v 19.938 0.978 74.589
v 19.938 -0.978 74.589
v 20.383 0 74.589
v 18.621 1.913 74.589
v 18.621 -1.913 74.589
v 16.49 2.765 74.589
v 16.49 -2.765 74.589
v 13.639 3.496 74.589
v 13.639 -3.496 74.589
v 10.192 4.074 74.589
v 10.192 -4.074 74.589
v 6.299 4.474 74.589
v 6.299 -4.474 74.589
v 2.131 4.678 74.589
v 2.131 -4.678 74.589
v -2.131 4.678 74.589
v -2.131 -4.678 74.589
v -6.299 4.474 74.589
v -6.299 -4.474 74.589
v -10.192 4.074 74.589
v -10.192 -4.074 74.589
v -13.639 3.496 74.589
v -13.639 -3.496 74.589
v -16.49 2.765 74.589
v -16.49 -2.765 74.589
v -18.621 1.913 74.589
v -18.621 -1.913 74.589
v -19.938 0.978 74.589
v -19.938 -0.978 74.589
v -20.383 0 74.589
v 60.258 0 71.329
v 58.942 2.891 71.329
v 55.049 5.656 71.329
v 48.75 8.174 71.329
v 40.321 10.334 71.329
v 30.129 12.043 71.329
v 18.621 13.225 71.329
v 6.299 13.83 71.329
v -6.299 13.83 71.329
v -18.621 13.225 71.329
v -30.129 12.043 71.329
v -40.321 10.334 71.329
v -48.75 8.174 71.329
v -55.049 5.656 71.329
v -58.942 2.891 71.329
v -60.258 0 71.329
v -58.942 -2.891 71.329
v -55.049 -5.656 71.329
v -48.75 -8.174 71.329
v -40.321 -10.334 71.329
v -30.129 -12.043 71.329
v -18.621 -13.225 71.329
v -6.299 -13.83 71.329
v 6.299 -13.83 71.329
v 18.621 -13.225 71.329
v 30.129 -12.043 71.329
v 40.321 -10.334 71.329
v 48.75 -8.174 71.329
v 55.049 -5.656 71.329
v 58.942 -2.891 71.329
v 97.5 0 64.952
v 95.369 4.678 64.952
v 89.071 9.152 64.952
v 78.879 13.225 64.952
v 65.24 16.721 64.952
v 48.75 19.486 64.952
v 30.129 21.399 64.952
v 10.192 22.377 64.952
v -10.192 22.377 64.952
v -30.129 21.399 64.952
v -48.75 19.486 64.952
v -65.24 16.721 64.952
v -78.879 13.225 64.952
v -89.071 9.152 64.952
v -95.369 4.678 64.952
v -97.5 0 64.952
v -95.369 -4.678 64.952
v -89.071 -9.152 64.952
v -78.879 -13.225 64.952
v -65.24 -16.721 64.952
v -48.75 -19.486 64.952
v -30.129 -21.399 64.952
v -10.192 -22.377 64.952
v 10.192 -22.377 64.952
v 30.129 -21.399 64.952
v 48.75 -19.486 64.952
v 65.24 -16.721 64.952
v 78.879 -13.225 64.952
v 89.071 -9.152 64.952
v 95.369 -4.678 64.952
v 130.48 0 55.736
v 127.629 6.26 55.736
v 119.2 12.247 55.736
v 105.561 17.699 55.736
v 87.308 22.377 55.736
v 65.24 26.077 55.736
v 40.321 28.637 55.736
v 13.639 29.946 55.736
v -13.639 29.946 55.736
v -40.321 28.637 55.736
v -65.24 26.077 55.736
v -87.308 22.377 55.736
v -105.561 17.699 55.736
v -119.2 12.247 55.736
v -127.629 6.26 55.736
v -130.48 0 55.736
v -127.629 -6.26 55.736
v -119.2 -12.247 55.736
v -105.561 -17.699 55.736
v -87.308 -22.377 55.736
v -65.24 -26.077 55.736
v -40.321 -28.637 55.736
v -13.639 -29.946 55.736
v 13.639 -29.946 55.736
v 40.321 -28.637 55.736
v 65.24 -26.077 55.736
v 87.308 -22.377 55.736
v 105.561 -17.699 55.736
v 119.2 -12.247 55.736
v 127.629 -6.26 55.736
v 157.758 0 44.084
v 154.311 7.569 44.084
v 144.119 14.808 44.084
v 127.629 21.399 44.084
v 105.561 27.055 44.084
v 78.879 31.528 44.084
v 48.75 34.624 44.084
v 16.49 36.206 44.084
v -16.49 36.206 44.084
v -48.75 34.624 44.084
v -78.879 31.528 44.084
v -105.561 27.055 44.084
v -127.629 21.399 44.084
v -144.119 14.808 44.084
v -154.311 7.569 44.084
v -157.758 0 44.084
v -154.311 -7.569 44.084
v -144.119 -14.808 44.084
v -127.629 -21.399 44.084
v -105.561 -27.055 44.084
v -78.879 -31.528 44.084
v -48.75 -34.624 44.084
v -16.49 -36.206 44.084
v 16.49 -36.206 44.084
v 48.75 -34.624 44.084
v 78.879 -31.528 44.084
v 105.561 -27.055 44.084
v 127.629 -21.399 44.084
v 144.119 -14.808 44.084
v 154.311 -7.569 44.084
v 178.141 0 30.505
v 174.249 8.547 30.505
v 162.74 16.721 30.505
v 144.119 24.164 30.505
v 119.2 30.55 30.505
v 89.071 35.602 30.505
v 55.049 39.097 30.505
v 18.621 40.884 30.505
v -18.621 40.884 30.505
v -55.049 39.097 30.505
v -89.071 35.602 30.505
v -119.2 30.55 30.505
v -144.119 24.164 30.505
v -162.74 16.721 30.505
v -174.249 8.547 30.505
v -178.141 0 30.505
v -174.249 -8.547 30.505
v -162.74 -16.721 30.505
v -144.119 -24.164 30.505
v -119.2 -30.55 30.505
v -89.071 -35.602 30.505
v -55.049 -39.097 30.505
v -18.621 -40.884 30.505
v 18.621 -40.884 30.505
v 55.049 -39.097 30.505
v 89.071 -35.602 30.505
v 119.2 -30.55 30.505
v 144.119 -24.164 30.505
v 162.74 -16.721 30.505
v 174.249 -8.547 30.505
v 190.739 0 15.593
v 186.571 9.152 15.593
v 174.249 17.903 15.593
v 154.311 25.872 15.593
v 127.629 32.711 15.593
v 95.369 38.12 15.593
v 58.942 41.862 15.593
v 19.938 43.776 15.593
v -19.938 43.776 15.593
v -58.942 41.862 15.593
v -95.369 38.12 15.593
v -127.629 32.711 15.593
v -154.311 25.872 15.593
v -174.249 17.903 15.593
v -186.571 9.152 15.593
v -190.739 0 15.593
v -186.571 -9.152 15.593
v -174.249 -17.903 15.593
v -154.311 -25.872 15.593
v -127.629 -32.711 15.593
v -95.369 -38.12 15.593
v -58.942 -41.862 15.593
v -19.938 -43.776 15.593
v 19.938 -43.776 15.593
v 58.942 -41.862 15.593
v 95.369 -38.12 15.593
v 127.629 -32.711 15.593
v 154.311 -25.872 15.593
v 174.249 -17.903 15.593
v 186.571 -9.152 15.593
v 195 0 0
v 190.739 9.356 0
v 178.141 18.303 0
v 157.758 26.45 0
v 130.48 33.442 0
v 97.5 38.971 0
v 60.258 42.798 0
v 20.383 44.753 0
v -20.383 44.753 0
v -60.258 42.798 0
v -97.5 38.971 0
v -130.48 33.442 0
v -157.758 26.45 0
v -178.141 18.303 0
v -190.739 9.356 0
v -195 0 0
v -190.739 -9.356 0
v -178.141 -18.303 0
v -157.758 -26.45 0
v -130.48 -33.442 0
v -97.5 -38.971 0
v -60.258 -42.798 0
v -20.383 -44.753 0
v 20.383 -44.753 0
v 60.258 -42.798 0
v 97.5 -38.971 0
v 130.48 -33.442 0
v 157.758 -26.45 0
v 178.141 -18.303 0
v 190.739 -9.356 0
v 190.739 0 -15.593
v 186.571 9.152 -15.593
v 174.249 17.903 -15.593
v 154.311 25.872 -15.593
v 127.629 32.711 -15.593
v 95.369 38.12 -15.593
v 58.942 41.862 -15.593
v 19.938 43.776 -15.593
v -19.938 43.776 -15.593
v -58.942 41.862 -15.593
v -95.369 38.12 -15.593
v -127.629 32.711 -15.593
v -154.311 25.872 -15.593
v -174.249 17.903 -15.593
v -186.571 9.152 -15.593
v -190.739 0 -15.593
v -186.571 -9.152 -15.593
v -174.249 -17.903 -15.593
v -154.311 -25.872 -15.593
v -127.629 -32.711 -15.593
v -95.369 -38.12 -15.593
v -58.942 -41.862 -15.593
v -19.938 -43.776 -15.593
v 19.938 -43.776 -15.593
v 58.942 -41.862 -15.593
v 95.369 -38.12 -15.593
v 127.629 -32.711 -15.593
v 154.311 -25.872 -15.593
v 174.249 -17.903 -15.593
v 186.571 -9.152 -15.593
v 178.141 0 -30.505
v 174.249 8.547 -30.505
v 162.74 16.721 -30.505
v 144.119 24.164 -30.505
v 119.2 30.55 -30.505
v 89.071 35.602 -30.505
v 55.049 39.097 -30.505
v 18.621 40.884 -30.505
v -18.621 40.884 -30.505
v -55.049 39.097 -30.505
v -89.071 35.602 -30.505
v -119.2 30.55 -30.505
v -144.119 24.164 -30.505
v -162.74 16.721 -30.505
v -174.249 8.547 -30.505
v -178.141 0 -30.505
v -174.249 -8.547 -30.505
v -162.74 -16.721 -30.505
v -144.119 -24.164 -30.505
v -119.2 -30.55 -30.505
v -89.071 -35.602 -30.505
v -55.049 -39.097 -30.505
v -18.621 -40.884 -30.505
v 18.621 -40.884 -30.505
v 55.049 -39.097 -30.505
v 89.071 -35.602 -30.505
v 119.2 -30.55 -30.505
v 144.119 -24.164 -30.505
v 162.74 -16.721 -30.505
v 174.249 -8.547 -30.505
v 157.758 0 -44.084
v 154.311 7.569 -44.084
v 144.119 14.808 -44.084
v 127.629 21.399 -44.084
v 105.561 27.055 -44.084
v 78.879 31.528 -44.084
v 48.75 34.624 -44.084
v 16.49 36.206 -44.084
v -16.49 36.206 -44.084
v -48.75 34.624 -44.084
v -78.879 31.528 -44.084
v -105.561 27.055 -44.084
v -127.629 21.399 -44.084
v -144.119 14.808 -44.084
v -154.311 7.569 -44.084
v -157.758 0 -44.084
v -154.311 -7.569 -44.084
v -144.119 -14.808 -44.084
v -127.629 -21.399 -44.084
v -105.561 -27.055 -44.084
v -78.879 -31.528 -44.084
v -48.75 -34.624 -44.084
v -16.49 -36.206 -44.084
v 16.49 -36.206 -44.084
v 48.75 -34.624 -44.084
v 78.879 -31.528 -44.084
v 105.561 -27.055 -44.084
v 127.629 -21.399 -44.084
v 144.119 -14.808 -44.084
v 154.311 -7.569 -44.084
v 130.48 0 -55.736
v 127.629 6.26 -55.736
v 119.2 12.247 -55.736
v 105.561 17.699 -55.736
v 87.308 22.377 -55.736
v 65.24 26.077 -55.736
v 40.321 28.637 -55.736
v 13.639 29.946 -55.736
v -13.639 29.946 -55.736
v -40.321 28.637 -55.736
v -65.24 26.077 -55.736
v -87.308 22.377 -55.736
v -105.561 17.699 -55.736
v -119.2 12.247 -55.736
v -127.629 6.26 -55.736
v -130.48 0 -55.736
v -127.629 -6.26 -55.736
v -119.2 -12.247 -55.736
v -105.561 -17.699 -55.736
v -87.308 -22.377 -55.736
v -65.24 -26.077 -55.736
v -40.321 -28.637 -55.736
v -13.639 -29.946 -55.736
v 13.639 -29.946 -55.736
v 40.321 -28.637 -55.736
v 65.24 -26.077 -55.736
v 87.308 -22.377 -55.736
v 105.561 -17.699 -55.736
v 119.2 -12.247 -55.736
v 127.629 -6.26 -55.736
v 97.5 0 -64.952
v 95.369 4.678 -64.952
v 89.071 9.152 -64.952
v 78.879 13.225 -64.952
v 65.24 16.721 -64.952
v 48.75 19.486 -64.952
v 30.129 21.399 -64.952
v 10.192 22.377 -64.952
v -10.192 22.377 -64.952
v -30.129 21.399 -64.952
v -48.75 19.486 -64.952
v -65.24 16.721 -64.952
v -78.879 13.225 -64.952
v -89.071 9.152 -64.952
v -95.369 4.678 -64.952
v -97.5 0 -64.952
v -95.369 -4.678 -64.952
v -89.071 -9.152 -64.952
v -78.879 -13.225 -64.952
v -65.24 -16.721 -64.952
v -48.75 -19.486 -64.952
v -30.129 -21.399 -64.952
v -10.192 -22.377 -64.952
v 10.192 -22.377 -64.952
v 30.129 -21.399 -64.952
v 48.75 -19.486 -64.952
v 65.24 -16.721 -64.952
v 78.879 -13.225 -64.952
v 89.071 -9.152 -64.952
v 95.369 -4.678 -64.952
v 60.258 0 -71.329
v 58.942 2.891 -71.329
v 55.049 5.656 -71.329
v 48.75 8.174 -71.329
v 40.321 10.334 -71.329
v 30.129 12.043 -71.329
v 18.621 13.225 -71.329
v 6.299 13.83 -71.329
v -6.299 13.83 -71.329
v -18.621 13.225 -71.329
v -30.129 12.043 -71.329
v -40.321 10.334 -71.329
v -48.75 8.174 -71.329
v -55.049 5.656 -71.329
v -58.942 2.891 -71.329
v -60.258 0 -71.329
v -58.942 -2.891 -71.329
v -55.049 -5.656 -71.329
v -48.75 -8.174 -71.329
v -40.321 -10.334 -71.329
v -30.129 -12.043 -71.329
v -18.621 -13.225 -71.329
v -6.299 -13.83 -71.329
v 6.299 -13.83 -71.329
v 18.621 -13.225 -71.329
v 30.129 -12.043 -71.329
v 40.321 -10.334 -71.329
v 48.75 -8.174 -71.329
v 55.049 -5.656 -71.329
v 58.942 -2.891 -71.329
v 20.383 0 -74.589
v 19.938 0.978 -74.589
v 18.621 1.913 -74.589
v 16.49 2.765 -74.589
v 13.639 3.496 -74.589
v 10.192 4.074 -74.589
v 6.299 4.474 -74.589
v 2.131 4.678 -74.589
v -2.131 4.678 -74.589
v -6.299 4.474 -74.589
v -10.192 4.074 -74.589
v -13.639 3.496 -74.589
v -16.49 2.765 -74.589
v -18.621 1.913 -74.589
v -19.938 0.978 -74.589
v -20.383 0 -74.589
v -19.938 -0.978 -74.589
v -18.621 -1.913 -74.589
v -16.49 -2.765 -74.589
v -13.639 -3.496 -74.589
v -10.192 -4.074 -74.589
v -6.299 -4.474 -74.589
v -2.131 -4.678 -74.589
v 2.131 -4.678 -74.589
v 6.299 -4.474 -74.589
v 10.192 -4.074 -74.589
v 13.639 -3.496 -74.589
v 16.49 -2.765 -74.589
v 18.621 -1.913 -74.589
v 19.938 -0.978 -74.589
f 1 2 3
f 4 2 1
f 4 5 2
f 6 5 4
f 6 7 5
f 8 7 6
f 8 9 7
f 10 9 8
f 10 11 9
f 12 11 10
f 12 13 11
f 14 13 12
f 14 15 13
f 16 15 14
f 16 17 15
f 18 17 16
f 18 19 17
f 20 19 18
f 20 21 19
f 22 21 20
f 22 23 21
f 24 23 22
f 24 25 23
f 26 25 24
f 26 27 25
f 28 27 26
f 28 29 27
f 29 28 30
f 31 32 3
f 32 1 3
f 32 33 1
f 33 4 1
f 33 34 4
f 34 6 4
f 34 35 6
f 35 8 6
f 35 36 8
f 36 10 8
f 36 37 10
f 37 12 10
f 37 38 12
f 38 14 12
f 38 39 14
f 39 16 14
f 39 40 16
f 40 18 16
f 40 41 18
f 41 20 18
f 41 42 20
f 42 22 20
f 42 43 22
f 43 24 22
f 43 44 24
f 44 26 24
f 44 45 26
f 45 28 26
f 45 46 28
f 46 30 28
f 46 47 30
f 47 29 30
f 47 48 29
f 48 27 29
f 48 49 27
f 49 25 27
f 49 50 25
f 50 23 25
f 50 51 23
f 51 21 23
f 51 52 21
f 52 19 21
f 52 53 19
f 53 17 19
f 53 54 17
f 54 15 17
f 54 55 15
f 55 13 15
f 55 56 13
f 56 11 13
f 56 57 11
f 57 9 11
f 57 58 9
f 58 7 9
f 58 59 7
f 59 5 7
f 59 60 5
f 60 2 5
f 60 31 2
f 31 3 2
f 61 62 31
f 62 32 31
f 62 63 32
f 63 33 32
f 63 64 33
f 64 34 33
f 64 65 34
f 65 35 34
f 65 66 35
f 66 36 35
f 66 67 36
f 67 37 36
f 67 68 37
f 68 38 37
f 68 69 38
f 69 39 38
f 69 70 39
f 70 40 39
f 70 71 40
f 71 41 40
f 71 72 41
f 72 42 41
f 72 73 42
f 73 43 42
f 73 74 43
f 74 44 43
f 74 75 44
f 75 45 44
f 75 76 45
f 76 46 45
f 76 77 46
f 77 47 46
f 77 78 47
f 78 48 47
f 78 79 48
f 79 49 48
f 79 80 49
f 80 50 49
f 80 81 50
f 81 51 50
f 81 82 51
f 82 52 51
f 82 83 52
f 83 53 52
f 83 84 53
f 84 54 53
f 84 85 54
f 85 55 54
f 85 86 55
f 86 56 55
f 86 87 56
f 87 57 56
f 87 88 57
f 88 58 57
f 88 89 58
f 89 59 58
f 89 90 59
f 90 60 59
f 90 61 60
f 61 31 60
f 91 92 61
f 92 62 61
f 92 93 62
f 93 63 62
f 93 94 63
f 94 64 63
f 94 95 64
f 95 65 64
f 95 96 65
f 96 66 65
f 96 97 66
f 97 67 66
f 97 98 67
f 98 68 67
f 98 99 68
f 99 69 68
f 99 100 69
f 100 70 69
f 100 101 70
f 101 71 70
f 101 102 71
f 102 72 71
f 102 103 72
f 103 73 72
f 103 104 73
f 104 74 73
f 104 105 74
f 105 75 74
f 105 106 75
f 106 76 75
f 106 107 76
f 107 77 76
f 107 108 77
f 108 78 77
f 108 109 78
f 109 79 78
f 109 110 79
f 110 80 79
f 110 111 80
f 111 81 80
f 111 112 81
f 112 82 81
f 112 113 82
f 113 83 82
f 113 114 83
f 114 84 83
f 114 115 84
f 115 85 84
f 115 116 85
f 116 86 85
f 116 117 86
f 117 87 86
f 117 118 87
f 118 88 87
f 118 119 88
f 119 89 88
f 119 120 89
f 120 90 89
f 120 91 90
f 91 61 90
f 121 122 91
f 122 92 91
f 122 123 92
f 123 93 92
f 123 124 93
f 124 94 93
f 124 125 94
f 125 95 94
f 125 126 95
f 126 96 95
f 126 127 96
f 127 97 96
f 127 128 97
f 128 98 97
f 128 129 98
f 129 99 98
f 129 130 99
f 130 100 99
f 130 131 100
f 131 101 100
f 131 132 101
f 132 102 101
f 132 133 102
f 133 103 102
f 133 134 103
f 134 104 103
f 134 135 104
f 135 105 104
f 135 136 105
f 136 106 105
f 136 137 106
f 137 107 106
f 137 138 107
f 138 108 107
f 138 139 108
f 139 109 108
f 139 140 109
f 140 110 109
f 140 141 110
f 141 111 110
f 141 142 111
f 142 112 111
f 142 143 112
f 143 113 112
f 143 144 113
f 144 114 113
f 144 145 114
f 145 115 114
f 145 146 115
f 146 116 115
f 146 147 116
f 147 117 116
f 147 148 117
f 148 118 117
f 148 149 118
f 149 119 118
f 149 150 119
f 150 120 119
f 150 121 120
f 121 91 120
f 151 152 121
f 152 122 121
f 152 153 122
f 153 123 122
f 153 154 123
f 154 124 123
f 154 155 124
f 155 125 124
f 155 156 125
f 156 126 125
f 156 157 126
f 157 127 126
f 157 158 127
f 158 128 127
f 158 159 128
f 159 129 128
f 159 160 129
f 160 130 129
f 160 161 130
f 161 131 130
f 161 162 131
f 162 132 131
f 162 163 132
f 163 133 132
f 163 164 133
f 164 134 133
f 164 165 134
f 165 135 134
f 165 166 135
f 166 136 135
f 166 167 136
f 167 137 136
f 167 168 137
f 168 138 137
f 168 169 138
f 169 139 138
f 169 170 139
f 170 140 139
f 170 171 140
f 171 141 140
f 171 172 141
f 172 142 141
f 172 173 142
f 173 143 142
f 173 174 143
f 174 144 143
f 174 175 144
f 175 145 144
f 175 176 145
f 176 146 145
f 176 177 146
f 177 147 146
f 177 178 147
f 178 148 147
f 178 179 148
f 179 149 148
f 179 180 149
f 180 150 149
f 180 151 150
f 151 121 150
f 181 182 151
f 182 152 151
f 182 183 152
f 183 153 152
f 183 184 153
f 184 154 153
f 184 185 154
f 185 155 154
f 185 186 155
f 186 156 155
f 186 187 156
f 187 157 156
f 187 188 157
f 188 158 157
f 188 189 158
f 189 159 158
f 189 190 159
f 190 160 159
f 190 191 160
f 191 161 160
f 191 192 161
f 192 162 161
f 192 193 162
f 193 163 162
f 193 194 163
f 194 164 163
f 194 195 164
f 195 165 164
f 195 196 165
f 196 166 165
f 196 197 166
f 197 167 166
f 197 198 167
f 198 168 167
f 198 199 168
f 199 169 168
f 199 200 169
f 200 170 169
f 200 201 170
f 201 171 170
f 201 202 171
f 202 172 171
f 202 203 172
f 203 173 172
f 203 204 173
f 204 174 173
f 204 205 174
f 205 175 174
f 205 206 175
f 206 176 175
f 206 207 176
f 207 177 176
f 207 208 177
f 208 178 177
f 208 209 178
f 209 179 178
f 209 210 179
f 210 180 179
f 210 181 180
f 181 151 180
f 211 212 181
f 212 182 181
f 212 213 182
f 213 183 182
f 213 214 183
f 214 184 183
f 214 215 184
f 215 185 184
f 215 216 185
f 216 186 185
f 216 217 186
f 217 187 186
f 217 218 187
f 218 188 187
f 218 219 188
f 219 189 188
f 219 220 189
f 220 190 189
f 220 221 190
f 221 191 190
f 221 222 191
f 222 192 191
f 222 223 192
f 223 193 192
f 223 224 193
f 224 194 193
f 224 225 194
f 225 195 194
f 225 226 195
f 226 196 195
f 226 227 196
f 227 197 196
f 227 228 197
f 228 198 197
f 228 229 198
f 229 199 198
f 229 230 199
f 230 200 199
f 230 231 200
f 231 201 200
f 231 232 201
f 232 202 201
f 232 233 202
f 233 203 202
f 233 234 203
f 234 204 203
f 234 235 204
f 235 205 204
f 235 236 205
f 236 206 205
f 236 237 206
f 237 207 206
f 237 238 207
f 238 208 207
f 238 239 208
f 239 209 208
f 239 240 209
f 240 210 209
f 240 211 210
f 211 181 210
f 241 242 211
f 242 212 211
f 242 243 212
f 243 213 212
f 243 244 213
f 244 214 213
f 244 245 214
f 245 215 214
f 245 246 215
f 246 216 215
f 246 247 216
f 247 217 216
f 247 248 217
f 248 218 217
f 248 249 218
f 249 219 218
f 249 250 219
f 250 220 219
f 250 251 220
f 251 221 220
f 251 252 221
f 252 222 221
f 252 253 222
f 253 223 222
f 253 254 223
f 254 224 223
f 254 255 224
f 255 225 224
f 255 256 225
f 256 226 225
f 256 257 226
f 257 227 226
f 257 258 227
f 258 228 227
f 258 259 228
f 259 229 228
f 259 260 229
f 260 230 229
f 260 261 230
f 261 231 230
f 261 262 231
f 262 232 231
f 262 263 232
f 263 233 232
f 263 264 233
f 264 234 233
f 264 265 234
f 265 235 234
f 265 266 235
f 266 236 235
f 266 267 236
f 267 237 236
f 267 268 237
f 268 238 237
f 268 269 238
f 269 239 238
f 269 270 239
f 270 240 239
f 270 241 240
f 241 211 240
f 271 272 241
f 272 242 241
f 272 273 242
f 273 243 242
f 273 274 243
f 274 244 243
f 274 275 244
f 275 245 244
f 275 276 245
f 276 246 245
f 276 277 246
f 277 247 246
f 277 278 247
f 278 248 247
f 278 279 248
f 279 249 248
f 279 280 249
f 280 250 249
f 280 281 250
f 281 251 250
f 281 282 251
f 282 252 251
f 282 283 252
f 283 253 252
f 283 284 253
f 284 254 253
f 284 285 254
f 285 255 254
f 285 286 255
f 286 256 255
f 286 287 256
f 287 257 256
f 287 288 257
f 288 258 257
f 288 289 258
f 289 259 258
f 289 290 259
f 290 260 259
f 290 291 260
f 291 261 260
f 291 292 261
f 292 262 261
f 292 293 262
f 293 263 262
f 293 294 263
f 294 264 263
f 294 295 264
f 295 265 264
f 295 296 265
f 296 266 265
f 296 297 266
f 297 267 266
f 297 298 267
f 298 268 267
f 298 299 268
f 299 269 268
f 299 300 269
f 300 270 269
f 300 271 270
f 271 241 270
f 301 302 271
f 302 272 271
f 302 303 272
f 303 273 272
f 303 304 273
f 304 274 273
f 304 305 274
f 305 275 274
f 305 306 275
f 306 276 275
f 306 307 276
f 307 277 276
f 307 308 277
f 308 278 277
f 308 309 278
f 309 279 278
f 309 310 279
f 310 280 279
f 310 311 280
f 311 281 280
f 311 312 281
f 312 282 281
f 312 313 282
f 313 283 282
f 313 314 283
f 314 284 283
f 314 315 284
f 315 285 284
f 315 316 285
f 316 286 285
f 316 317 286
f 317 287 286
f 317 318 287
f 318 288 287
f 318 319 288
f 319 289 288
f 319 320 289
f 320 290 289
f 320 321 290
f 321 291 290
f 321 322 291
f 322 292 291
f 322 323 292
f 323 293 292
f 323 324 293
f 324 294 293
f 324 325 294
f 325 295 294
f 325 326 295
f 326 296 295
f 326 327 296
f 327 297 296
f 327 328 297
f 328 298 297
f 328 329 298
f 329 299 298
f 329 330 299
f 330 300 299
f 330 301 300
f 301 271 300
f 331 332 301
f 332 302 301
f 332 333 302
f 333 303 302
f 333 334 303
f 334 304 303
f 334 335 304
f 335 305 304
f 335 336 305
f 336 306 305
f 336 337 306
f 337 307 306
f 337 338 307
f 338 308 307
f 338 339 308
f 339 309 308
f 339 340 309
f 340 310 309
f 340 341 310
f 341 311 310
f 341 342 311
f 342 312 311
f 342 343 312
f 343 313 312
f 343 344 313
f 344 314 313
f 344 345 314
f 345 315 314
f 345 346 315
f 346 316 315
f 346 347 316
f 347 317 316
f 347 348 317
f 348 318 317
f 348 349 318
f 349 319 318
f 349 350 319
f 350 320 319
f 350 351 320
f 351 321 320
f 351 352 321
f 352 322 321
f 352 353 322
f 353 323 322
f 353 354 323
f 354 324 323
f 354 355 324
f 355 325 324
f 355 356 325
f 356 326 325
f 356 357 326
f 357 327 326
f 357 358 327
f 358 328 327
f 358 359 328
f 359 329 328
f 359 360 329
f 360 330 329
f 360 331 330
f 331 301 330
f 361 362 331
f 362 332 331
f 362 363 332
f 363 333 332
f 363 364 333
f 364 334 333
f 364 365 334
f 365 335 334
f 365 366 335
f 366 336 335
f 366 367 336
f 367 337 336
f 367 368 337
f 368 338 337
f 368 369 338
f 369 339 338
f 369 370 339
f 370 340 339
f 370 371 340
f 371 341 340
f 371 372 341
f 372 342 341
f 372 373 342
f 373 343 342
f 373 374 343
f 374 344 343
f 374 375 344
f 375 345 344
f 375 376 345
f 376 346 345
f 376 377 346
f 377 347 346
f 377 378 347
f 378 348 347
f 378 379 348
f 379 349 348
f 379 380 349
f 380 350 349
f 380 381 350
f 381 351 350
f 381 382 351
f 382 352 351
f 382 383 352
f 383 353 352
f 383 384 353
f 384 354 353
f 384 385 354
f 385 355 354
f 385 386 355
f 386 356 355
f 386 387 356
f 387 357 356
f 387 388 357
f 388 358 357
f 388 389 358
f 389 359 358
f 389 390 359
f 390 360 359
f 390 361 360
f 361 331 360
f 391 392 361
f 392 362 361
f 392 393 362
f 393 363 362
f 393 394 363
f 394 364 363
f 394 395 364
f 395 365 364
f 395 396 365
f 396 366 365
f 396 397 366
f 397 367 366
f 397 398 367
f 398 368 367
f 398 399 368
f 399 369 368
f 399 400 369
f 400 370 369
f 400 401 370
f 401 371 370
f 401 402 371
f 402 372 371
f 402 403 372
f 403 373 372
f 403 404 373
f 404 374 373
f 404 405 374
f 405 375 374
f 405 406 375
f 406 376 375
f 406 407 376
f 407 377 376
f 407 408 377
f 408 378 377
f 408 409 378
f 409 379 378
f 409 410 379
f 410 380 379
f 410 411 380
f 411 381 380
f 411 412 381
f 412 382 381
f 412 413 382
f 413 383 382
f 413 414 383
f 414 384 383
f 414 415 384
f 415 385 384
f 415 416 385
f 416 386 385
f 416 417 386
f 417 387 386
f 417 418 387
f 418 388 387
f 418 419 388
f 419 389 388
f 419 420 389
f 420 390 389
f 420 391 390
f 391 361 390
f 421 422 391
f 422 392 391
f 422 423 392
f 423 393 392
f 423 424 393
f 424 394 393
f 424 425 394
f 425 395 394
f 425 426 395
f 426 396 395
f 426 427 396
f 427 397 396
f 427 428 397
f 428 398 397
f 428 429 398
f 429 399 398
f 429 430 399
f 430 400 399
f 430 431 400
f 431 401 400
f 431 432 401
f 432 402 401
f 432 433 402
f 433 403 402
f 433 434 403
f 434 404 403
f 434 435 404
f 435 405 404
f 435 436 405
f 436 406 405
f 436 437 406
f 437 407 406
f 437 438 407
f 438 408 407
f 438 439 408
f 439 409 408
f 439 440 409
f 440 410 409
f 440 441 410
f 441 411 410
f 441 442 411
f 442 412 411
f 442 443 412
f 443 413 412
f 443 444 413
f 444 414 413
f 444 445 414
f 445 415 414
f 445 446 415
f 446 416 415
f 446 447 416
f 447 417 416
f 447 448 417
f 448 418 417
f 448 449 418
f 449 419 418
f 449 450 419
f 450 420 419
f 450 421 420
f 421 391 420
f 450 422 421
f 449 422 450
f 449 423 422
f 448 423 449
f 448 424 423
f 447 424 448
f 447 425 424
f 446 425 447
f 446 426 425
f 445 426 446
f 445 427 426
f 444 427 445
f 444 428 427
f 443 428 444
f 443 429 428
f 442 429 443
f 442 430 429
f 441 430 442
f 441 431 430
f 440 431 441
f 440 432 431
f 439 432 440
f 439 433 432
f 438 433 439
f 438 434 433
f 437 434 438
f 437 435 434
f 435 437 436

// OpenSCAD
// Generated by SolidPython 1.0.1 on 2020-07-29 00:46:50


scale(v = [13, 3, 5]) {
	sphere(r = 15);
}
/***********************************************
*********      SolidPython code:      **********
************************************************
 
# import packages: SolidPython
from solid import *
from solid.utils import *
from itertools import chain, combinations, permutations


class Resize:

    def __init__(self, scad_file):
        self.scad_file = scad_file
        #self.scad_file = import_scad(scad_file)
        # cone/cylinder param:
        self.r1 = 0
        self.r2 = 0
        self.h = 0
        # rectangular prism param:
        self.w = 0
        self.l = 0
        # ellipse param:
        self.r = 0

    # import OpenScad code (file name corresponds to shape)


    # classify shape + parameters
    def assign(self, param1, param2, param3):
        if self.scad_file == 'cone.scad':
            self.r1 = param1
            self.r2 = param2
            self.h = param3
        elif self.scad_file == 'cylinder.scad':
            self.r1 = param1
            self.r2 = param2
            self.h = param3
        elif self.scad_file == 'rectangularPrism.scad':
            self.h = param1
            self.l = param2
            self.w = param3
        else:
            self.r = param1
            self.h = param2

    # resize parameters
    def iterate(self):
        x = range(3, 20, 2)
        i = 1
        if self.scad_file == 'cone.scad':
            tempList = list(permutations(x, 2))
            for temp in tempList:
                param1 = temp[0]
                param2 = temp[1]
                filepath = 'produced_scad_files/' + 'cone' + str(param1) + '_' + str(param2) + '_' + '.scad'
                scad_render_to_file(cylinder(h=param1, r1=param2, r2=0), filepath)

        elif self.scad_file == 'cylinder.scad':
            tempList = list(permutations(x, 3))
            for temp in tempList:
                param1 = temp[0]
                param2 = temp[1]
                filepath = 'produced_scad_files/' + 'cylinder' + str(param1) + '_' + str(param2) + '_' + '.scad'
                scad_render_to_file(cylinder(h=param1, r1=param2, r2=param2), filepath)

        elif self.scad_file == 'rectangularPrism.scad':
            tempList = list(permutations(x, 3))
            for temp in tempList:
                param1 = temp[0]
                param2 = temp[1]
                param3 = temp[2]
                filepath = 'produced_scad_files/' + 'rectangularPrism' + str(param1) + '_' + str(param2) + '_' + str(
                    param3) + '.scad'
                scad_render_to_file(cube(size=(param1, param2, param3)), filepath)

        elif self.scad_file == 'ellipse.scad':
            tempList = list(permutations(x, 4))
            for temp in tempList:
                param1 = temp[0]
                param2 = temp[1]
                param3 = temp[2]
                param4 = temp[3]
                filepath = 'produced_scad_files/' + 'ellipse' + str(param1) + '_' + str(param2) + '_' + str(param3) + '_' + str(param4) + '.scad'
                scad_render_to_file(scale([param1, param2, param3])(sphere(r=param4)), filepath)

    def render_to_scadfile(self):
        scad_render_to_file(scad, 'example.scad') 
 
************************************************/
